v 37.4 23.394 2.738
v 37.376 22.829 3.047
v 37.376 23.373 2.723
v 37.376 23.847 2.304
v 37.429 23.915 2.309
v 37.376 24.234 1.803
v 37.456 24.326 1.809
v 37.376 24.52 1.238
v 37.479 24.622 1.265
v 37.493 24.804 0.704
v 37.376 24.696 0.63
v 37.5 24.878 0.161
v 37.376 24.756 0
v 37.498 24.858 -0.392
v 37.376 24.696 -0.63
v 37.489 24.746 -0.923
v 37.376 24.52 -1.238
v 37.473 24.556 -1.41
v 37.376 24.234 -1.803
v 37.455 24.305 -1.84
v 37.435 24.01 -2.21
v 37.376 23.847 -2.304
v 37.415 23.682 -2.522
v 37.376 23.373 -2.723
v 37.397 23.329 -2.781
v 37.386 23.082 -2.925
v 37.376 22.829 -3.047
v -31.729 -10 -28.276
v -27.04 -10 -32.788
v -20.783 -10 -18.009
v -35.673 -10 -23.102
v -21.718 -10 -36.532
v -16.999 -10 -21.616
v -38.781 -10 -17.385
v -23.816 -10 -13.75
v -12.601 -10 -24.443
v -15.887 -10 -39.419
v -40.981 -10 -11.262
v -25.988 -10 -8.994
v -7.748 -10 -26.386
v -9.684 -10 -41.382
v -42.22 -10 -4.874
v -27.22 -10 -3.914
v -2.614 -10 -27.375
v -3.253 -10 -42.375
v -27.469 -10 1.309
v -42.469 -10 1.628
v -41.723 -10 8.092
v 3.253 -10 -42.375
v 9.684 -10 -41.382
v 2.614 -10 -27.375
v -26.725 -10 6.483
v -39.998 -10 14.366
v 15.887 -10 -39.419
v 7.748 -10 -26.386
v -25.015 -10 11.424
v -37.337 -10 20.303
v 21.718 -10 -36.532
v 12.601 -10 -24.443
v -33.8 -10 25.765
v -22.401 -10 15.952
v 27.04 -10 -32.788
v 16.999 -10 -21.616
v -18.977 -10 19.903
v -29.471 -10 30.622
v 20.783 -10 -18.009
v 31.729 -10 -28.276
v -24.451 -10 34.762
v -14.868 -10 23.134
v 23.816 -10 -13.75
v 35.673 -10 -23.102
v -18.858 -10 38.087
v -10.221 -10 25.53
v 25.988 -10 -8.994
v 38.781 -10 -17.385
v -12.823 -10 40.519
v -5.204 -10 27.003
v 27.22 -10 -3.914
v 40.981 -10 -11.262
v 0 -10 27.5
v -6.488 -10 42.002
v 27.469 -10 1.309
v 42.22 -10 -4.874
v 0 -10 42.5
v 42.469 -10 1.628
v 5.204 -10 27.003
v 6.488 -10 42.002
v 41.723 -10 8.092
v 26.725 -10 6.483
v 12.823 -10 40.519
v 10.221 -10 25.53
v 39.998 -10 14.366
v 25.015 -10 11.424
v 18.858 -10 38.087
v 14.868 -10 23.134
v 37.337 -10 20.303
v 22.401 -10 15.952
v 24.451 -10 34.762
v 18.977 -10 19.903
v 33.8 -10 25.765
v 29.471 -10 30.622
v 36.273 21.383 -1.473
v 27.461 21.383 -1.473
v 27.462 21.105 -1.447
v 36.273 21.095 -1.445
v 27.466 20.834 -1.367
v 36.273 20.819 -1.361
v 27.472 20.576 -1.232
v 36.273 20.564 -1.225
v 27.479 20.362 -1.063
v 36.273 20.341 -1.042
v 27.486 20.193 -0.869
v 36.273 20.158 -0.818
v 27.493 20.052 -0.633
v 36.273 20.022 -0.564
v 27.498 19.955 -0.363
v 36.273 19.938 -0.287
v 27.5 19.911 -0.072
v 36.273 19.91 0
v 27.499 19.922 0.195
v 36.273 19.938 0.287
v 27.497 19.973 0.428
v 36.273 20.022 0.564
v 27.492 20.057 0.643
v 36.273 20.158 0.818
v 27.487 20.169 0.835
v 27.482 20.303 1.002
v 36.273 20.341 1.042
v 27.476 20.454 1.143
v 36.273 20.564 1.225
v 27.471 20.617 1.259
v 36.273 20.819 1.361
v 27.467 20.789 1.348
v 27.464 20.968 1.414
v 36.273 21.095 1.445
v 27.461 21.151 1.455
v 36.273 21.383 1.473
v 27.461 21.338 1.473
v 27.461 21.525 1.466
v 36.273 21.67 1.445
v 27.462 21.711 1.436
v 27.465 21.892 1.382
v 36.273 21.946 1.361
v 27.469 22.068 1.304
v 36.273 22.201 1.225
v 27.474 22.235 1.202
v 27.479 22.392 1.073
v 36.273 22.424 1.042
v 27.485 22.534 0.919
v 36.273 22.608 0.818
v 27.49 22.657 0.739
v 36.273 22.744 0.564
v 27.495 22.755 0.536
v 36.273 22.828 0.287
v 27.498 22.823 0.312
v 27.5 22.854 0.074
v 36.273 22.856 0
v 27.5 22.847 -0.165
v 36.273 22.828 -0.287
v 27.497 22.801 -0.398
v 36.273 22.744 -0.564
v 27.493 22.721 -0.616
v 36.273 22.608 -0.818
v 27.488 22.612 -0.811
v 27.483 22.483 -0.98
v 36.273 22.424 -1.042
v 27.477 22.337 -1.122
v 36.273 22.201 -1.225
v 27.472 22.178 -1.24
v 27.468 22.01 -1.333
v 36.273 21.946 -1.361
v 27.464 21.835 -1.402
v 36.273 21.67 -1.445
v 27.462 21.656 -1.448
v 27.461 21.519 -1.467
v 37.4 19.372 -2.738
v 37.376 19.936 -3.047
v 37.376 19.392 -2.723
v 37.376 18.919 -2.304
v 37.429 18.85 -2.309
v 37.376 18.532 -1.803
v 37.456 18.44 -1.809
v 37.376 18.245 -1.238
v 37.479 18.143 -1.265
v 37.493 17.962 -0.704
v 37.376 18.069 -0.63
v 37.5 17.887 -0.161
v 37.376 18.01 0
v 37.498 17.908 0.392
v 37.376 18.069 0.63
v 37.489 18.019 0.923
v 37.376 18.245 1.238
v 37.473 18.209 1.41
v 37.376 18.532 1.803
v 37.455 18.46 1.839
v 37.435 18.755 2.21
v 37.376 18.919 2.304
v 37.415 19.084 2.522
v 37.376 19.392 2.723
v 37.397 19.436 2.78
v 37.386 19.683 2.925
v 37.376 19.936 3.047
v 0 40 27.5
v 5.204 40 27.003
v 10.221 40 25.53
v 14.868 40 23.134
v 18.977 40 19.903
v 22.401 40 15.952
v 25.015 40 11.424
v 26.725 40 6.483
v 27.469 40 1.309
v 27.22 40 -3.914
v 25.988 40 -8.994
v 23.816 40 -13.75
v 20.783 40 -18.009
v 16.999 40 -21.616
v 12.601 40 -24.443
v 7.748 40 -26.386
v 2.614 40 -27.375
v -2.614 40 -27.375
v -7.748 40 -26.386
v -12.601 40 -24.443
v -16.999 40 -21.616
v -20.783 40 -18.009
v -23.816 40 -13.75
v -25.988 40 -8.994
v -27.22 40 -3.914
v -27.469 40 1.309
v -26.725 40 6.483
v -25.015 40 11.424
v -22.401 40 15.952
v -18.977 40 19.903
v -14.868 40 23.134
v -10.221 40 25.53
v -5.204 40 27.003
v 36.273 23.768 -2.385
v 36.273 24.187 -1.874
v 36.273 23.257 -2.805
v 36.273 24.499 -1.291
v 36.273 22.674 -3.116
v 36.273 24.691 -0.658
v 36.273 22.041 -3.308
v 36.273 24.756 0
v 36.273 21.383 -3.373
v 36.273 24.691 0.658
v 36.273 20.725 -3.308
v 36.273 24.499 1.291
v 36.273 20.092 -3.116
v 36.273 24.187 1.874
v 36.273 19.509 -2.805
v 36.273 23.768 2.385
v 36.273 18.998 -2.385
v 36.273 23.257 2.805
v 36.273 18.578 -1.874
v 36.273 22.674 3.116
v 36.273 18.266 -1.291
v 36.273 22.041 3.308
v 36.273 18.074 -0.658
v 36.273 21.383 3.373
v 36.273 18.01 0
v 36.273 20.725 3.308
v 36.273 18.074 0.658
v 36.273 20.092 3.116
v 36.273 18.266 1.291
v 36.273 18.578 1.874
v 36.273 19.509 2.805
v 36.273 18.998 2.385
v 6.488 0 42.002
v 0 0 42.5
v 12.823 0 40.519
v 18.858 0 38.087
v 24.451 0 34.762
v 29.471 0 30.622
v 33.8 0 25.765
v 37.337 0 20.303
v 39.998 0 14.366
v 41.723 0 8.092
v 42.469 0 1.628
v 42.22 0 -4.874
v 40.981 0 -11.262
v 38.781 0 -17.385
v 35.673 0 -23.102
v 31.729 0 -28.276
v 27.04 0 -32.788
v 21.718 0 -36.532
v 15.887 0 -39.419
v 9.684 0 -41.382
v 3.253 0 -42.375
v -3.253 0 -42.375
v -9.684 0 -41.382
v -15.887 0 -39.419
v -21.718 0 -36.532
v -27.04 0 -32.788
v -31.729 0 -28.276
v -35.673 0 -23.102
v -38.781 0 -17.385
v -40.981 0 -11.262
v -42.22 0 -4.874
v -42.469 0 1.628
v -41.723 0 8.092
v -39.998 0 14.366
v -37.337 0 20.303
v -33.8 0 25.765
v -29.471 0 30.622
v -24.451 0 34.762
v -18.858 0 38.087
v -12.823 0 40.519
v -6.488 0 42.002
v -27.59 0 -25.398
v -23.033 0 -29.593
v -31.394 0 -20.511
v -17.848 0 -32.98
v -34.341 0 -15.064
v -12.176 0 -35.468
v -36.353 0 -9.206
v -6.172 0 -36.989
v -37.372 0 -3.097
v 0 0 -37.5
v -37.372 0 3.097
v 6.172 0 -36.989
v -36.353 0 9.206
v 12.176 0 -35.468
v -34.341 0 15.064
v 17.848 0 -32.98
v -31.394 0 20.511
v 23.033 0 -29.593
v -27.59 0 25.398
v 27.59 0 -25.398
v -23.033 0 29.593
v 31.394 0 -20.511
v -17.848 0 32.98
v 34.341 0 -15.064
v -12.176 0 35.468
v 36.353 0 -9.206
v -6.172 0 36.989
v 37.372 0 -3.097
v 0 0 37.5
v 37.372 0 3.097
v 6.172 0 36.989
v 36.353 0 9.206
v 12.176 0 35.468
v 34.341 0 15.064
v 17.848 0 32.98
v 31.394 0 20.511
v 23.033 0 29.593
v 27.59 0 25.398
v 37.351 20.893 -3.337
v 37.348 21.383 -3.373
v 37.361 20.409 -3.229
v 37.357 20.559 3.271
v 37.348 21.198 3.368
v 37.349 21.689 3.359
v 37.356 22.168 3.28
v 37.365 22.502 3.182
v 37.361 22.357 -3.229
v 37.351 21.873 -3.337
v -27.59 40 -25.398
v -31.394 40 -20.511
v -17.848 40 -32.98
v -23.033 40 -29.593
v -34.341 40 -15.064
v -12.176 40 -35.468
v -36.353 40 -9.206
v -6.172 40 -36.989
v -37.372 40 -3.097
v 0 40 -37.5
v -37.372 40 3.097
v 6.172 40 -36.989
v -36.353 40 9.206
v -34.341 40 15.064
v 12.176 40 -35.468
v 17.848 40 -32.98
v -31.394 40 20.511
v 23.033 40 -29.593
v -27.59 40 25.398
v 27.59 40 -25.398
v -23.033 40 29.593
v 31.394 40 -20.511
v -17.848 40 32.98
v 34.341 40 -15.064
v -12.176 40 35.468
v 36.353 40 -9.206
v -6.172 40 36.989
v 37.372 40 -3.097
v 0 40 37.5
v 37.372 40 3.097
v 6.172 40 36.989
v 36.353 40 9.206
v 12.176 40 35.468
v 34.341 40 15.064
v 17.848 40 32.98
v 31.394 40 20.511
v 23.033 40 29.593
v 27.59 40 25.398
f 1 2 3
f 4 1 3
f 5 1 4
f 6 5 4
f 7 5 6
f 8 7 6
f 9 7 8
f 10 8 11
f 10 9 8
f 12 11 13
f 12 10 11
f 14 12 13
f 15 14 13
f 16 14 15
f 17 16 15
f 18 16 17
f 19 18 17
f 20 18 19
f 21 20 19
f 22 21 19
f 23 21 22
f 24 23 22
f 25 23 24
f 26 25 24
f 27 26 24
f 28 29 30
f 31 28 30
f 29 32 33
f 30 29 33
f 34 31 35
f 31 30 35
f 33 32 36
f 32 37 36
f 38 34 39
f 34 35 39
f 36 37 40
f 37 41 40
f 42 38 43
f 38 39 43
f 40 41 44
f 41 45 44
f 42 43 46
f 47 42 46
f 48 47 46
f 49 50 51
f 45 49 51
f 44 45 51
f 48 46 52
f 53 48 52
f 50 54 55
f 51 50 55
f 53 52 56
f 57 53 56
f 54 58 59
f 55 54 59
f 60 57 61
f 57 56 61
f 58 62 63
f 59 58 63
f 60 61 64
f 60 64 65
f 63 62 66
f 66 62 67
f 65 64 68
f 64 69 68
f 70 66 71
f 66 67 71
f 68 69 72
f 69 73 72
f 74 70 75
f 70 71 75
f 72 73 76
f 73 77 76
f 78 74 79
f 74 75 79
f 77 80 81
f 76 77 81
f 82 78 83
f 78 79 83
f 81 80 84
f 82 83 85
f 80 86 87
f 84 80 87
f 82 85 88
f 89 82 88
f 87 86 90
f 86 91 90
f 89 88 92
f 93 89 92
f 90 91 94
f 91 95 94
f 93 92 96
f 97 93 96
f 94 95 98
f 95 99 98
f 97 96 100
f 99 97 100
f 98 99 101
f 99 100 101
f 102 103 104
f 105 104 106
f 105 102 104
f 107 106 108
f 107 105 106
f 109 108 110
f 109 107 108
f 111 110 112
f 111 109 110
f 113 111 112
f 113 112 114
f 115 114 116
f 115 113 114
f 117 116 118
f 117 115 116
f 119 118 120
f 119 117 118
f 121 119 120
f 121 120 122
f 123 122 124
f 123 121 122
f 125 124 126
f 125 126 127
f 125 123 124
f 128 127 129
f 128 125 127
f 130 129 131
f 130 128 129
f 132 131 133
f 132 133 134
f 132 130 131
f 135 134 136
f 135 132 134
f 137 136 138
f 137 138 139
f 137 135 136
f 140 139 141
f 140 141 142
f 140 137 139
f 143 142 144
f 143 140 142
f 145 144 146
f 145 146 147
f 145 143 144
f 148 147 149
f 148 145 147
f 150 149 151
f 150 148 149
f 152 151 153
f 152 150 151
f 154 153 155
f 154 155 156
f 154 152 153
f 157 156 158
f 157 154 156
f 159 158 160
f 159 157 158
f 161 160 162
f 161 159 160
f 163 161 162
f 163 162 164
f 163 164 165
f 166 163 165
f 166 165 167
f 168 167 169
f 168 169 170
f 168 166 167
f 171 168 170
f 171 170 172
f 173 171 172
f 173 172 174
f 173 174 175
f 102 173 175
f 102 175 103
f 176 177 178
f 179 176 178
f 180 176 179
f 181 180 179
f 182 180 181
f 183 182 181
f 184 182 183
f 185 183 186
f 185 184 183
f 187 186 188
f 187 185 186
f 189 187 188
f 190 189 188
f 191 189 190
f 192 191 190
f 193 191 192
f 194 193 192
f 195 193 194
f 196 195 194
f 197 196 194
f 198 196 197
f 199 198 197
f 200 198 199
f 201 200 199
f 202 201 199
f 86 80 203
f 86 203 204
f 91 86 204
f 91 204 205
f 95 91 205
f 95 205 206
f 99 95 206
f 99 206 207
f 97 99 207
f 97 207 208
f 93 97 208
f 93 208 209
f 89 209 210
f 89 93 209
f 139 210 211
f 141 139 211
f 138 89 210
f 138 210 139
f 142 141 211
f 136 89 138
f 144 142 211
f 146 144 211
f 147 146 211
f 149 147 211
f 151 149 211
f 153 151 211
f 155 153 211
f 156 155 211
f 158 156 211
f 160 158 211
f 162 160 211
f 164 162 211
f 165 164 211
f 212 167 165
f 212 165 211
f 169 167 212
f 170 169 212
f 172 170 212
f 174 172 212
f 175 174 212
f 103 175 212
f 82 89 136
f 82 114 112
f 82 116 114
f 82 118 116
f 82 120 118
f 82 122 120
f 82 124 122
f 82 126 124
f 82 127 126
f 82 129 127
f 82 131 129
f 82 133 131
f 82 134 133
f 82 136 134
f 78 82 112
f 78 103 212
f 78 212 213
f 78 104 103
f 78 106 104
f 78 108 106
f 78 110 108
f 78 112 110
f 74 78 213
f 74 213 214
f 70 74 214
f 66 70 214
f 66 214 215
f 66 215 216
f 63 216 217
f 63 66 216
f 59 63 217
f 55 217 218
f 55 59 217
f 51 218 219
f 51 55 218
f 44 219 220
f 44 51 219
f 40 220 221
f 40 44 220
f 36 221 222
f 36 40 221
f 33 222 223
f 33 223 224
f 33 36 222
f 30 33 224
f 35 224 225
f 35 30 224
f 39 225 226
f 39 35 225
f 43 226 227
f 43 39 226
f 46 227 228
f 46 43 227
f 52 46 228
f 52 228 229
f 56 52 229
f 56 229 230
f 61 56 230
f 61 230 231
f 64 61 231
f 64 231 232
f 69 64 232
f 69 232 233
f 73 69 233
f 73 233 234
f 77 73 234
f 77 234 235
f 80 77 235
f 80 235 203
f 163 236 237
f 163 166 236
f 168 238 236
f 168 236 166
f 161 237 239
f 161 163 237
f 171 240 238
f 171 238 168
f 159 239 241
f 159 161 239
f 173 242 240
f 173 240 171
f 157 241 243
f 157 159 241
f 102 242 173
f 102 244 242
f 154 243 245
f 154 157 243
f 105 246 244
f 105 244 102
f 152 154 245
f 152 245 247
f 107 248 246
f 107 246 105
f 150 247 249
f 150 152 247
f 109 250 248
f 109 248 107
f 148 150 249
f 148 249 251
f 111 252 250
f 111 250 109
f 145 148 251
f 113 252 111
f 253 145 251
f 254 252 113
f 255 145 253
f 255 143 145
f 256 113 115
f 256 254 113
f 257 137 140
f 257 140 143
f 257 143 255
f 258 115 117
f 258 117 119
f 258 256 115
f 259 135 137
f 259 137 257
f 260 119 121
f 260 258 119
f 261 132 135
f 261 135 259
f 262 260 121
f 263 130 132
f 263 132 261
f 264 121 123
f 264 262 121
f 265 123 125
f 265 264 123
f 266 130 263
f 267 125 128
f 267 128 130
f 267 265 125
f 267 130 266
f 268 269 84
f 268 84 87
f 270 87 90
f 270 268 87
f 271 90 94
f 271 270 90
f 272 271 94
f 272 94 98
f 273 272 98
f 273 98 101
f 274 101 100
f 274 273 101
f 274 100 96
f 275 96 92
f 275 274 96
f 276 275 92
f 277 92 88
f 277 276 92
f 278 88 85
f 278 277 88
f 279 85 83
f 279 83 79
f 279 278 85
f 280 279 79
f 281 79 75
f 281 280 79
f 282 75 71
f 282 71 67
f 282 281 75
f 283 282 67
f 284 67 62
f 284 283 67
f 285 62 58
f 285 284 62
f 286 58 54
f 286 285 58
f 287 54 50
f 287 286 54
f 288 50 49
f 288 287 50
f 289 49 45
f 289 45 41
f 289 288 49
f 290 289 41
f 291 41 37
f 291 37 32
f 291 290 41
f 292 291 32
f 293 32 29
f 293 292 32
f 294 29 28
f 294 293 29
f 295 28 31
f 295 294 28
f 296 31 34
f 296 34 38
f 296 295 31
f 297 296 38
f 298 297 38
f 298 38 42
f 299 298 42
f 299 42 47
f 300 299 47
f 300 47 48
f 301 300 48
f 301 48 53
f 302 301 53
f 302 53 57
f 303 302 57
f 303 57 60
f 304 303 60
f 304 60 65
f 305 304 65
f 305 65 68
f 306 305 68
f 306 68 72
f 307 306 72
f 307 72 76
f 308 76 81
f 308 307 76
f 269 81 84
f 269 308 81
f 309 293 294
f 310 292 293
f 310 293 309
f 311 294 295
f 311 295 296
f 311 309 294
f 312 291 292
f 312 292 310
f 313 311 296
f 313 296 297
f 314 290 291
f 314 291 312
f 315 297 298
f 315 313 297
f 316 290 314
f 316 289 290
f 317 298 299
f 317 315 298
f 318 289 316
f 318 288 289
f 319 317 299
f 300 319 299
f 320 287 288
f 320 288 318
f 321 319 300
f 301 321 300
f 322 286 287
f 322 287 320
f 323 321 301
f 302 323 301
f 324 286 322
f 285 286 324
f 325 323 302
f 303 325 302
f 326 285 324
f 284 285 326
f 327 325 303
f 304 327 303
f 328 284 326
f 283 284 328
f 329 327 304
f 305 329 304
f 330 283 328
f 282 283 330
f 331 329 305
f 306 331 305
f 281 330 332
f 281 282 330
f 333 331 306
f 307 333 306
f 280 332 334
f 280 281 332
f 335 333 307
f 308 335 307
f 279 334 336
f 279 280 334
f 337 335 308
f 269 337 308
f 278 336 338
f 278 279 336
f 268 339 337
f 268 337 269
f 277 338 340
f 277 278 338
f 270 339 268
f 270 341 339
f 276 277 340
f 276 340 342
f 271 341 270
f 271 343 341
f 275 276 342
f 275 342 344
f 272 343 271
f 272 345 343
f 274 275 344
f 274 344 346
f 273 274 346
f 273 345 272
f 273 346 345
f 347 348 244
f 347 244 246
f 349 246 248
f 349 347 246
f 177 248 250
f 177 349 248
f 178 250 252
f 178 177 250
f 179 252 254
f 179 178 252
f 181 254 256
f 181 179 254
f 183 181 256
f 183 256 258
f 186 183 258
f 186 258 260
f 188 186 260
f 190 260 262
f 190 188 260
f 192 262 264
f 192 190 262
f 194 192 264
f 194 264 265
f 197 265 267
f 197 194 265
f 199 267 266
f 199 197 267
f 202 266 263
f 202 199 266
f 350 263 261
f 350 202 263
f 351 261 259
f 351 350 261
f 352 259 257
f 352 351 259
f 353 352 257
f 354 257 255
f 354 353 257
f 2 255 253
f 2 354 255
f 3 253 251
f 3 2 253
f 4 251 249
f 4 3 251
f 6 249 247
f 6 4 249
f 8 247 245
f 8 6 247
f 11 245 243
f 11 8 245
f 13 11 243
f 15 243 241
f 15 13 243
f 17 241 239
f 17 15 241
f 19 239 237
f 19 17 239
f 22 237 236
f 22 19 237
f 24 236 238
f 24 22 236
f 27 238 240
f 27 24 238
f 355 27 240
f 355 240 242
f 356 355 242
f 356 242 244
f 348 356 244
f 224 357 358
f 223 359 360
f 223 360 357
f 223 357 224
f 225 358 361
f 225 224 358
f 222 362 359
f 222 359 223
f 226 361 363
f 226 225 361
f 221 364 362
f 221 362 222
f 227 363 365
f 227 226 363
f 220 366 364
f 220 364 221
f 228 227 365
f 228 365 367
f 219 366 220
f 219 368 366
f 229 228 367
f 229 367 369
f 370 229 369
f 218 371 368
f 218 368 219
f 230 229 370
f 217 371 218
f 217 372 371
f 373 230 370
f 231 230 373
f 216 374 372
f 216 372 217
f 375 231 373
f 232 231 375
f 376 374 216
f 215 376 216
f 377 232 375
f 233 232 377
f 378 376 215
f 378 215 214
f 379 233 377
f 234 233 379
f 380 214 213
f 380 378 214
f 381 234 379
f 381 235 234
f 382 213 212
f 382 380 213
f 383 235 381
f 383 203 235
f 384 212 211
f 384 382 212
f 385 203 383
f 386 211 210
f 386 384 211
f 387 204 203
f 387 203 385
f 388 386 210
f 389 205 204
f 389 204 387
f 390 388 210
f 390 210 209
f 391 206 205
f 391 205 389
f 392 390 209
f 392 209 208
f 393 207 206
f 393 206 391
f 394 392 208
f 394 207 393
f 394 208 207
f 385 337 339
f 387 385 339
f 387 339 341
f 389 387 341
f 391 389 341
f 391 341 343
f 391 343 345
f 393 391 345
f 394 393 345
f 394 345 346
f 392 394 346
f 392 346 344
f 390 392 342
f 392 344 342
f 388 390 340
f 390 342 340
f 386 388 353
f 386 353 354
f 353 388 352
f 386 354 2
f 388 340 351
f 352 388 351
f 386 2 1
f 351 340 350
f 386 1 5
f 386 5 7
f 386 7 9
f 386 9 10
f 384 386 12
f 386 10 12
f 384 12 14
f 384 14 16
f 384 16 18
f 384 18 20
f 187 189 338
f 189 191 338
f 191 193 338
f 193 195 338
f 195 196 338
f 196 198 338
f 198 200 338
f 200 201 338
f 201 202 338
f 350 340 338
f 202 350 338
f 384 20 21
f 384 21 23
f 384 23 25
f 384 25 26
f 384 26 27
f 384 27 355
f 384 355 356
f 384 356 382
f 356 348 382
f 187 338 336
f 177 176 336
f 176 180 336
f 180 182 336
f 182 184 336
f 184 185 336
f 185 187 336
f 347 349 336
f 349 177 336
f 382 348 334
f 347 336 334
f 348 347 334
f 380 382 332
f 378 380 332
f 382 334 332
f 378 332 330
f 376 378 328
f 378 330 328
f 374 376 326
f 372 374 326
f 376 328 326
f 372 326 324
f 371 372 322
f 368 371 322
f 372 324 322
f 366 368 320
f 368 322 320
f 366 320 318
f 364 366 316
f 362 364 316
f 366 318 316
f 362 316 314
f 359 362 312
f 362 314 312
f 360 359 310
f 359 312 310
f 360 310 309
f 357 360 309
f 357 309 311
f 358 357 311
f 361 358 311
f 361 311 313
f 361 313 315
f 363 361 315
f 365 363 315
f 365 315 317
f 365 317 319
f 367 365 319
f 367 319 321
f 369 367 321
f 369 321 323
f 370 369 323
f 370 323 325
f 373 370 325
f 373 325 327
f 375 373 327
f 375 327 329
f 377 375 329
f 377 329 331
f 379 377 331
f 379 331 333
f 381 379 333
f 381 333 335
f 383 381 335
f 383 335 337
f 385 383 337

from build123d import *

# Parameters (mm, degrees)
SKETCH1_R               = 37.5
BOSS_EXTRUDE1_DEPTH     = 40
SKETCH2_R               = 42.5
BOSS_EXTRUDE2_DEPTH     = 10
CUT_EXTRUDE1_DEPTH      = 40
CUT_EXTRUDE1_DEPTH_BACK = 10
SKETCH3_R               = 27.5


with BuildPart() as part:
    # Sketch1 → Boss-Extrude1 (new body)
    with BuildSketch(Plane(origin=(0, 0, 0), x_dir=(1, 0, 0), z_dir=(0, 1, 0))):
        with Locations(Location((0, 0, 0), (0, 0, 270))):
            Circle(SKETCH1_R)
    extrude(amount=BOSS_EXTRUDE1_DEPTH)

    # Sketch2 → Boss-Extrude2 (add)
    with BuildSketch(Plane(origin=(0, 0, 0), x_dir=(1, 0, 0), z_dir=(0, 1, 0))):
        with Locations(Location((0, 0, 0), (0, 0, 270))):
            Circle(SKETCH2_R)
    extrude(amount=-BOSS_EXTRUDE2_DEPTH)

    # Sketch3 → Cut-Extrude1 (cut, two sides: drawn at the far end of the back side and taken through both)
    with BuildSketch(Plane(origin=(0, 0, 0), x_dir=(1, 0, 0), z_dir=(0, 1, 0)).offset(-CUT_EXTRUDE1_DEPTH_BACK)):
        with Locations(Location((0, 0, 0), (0, 0, 270))):
            Circle(SKETCH3_R)
    extrude(amount=CUT_EXTRUDE1_DEPTH + CUT_EXTRUDE1_DEPTH_BACK, mode=Mode.SUBTRACT)

    # Sketch12 → CBORE for #4 Binding Head Machine Screw1 (revolve, cut)
    with BuildSketch(Plane(origin=(38, 21.382704805, 0), x_dir=(0, 0, -1), z_dir=(0, 1, 0))):
        Polygon((0, 0), (0, 18.885187864), (1.4732, 18), (1.4732, 1.7272), (3.37312, 1.7272), (3.37312, 0.624012762), (4.00812, 0), align=None)
    revolve(axis=Axis((44.35, 21.382704805, 0), (-1, 0, 0)), mode=Mode.SUBTRACT)


solid = part.part
